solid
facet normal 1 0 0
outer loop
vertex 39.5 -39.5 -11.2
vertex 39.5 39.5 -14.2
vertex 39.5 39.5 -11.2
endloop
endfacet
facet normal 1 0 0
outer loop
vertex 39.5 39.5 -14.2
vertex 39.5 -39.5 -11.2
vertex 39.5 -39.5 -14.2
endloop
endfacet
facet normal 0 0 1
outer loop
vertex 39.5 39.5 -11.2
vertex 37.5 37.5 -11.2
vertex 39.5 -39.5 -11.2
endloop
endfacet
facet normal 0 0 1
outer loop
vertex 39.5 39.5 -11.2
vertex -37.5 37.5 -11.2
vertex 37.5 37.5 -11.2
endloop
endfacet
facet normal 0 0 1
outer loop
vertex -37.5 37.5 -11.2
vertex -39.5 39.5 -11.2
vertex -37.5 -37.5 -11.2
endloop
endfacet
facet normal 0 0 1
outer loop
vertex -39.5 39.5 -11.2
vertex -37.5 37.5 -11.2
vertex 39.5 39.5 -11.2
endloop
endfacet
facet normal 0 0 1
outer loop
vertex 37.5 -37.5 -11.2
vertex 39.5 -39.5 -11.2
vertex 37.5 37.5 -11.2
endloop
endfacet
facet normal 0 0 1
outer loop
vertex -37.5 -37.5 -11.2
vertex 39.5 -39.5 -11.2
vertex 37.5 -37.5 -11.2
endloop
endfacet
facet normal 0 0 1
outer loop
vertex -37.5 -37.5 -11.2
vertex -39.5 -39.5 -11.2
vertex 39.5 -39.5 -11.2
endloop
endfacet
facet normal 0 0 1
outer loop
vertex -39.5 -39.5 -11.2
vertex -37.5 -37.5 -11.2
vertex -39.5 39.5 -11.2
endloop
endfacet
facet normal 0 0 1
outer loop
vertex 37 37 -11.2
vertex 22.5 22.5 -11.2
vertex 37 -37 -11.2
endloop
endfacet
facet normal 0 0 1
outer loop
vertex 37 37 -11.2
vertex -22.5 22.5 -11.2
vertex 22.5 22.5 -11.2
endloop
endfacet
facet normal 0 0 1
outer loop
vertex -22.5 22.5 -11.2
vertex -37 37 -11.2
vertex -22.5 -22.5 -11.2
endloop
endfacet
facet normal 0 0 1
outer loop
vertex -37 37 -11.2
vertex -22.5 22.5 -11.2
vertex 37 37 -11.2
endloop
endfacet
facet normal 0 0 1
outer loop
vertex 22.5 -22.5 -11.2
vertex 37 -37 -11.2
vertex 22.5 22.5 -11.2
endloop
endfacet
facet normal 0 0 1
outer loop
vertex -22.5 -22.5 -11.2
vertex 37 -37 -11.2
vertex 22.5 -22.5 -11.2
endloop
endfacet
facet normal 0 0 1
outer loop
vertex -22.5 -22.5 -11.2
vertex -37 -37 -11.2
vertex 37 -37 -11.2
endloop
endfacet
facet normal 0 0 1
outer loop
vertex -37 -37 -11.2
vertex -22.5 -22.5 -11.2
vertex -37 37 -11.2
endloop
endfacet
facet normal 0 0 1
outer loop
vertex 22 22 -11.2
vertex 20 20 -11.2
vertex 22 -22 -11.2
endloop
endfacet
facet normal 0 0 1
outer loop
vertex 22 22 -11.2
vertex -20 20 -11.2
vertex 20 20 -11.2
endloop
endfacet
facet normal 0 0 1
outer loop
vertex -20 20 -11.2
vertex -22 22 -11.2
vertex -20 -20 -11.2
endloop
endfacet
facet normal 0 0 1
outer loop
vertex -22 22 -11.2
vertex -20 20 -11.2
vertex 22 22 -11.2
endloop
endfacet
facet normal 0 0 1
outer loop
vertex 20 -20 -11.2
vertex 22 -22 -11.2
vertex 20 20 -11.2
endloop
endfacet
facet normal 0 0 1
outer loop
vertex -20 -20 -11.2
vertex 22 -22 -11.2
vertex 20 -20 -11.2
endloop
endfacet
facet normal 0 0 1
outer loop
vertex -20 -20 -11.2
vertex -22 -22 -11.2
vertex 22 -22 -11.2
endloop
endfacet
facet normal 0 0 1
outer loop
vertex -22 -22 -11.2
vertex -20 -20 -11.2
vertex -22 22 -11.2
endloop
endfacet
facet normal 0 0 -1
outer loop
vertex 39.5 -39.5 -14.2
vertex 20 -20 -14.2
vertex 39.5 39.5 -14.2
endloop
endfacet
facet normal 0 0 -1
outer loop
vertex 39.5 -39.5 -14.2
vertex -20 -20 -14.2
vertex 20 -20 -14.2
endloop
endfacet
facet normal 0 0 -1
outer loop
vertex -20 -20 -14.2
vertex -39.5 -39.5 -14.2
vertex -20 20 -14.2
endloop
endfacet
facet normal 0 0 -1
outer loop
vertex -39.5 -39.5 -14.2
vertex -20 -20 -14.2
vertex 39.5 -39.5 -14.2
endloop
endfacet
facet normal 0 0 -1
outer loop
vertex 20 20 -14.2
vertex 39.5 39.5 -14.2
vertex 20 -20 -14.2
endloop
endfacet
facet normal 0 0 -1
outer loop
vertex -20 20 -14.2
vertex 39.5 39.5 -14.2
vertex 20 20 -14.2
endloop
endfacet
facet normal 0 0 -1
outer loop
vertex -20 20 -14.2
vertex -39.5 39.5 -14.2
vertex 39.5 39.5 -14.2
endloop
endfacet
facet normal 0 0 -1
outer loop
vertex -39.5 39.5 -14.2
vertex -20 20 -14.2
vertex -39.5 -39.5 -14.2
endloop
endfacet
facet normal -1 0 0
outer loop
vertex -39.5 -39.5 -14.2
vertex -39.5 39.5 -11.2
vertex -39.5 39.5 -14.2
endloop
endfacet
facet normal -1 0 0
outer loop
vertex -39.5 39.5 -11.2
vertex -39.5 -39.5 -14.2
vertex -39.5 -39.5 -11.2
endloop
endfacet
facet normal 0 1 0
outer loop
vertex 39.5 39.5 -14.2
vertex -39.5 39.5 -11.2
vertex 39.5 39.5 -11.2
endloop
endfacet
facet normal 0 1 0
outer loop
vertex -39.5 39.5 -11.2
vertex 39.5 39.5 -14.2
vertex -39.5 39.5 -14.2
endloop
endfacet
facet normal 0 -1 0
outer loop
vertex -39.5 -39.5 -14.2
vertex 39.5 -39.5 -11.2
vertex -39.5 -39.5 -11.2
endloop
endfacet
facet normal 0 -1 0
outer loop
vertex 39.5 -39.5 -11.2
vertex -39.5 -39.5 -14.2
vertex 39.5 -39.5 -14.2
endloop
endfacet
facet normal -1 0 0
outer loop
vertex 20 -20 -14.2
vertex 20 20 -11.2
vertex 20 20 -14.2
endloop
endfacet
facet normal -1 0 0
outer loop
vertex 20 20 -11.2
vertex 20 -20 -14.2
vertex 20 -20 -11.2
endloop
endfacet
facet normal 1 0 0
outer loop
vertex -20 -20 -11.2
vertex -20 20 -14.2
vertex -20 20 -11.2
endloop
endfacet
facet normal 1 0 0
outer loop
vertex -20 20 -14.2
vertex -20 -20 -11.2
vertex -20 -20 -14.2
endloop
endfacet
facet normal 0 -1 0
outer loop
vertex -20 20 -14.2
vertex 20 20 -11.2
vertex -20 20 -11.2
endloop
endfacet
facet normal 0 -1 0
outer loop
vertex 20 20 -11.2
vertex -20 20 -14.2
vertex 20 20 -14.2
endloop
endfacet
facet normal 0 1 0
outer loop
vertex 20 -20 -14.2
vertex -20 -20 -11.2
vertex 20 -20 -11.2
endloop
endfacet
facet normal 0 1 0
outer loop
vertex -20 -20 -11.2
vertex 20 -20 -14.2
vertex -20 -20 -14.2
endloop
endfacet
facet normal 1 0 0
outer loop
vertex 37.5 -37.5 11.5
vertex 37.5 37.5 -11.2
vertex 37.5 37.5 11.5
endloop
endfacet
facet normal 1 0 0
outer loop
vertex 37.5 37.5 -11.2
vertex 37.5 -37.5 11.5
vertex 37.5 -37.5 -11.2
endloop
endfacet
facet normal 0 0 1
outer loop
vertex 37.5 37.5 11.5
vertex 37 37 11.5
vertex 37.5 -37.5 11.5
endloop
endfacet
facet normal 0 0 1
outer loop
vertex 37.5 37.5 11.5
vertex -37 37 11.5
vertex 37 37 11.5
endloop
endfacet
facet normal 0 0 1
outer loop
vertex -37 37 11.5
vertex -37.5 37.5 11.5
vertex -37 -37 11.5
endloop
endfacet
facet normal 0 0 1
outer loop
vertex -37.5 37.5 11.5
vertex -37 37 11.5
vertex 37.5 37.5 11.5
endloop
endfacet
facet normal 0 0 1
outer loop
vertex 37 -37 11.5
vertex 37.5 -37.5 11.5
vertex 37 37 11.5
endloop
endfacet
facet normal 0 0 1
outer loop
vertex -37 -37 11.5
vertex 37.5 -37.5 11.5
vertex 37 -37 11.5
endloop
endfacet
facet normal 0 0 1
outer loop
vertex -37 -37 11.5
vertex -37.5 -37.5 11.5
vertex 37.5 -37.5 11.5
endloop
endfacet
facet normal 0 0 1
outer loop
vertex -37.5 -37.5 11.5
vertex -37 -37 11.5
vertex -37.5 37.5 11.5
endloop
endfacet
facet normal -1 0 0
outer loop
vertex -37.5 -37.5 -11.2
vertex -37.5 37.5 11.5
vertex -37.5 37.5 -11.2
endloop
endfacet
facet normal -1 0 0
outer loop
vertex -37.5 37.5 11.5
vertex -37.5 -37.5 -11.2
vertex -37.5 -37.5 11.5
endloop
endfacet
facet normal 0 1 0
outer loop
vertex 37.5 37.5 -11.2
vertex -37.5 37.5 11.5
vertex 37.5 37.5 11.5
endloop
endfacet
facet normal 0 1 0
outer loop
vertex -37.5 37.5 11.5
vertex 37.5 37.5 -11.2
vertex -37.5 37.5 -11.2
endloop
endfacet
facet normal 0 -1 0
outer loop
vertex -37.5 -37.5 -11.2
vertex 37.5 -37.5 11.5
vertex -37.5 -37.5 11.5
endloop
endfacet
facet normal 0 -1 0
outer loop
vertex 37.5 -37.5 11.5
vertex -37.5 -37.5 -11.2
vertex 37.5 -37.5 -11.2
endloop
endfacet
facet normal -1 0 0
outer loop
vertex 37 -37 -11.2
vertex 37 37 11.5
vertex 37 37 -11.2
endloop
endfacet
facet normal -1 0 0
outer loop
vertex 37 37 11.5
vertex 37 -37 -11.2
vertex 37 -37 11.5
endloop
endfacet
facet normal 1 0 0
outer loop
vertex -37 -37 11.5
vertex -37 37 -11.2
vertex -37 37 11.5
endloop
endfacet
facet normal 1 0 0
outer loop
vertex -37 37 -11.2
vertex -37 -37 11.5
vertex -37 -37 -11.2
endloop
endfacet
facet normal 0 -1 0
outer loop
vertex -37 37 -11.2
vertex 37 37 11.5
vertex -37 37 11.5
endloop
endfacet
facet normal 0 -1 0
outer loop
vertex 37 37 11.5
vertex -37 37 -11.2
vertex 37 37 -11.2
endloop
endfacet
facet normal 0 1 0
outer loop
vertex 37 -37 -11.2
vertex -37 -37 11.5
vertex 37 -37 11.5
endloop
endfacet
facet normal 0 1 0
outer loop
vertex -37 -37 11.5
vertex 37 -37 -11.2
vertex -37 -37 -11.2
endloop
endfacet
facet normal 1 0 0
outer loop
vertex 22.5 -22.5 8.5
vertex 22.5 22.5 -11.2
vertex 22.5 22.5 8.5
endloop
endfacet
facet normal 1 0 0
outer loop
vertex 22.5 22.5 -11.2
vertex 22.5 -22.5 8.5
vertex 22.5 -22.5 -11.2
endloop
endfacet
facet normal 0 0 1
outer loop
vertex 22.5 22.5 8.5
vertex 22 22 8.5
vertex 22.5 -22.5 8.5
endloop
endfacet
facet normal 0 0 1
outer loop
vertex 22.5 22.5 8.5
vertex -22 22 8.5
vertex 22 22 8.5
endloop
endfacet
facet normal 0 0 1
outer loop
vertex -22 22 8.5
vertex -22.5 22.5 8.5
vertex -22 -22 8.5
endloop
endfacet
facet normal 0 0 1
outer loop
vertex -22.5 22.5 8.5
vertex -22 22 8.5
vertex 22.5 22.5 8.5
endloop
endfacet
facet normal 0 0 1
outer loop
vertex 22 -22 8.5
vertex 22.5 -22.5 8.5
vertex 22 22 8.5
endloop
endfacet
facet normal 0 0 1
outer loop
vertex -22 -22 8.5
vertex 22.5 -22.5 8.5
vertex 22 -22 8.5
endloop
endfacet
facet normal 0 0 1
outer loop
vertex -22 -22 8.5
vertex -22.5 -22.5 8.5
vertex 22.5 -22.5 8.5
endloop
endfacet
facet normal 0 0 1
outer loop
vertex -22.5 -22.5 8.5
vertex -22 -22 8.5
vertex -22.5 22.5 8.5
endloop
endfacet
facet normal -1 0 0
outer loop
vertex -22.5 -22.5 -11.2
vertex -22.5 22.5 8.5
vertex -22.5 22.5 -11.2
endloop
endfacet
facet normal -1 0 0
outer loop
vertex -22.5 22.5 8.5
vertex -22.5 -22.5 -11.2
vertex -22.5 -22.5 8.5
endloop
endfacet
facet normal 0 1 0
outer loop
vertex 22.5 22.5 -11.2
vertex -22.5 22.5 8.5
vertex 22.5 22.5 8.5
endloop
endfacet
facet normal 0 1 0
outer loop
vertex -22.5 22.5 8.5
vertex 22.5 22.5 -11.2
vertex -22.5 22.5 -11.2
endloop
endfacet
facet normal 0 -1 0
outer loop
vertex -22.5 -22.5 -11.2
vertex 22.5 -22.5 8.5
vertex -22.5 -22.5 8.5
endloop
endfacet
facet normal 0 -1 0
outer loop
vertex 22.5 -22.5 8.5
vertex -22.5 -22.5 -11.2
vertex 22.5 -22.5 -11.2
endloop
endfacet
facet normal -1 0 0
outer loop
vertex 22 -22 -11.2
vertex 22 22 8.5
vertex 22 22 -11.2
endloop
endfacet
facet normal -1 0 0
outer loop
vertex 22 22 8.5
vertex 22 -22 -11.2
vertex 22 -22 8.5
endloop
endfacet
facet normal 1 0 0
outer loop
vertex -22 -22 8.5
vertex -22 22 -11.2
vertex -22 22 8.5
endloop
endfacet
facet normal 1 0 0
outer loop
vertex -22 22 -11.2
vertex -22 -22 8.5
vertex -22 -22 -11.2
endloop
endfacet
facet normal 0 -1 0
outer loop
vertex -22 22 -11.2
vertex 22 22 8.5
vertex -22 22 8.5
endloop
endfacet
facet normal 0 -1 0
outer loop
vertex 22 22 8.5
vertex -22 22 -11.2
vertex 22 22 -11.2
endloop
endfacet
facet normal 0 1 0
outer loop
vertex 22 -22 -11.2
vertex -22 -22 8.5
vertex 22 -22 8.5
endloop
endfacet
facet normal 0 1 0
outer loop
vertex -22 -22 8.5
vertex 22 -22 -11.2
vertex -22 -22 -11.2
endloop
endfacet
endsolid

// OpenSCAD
// Copyright (c) 2013, 2014 by Jean-Louis Paquelin (jlp6k).
// This work is licensed under the Creative Commons Attribution
// Partage dans les Mêmes Conditions 3.0 France License.
// To view a copy of this license, visit http://creativecommons.org/licenses/by-sa/3.0/fr/
// CC-BY-SA

// Created 2013-11-29
// Last modified 2014-02-15

// dimensions are set in millimeters

Has_Inner_Cutter = "yes"; // [yes:Output will have an inner cutter, no: simple cookie cutter]

Cutter_Thickness = 0.5;

Outer_Side = 75;
Outer_Height = 23;

Inner_Side_Difference = 15;
Inner_Height_Difference = 3;

Frame_Thickness = 3;
Frame_Flange = 2;

union() {
    // grip / frame
    translate([0, 0, -(Outer_Height / 2) - (Frame_Thickness / 2) + (Frame_Thickness / 10)])
        difference() {
            cube([Outer_Side + Frame_Flange * 2,
                  Outer_Side + Frame_Flange * 2,
                  Frame_Thickness],
                  center = true);

            if(Has_Inner_Cutter == "yes") {
                cube([Outer_Side - Inner_Side_Difference * 2 - Cutter_Thickness * 2 - Frame_Flange * 2,
                      Outer_Side - Inner_Side_Difference * 2 - Cutter_Thickness * 2 - Frame_Flange * 2,
                      Frame_Thickness + 1],
                      center = true);
            } else {
                cube([Outer_Side - Cutter_Thickness * 2 - Frame_Flange * 2,
                      Outer_Side - Cutter_Thickness * 2 - Frame_Flange * 2,
                      Frame_Thickness + 1],
                      center = true);

            }
        }

    // outer cutter
    difference() {
        cube([Outer_Side,
              Outer_Side,
              Outer_Height],
              center = true);
        cube([Outer_Side - Cutter_Thickness * 2,
              Outer_Side - Cutter_Thickness * 2,
              Outer_Height + 10],
              center = true);
    }


    if(Has_Inner_Cutter == "yes") {
        // inner cutter
        translate([0, 0,  -Inner_Height_Difference / 2])
            difference() {
                cube([Outer_Side - Inner_Side_Difference * 2,
                      Outer_Side - Inner_Side_Difference * 2,
                      Outer_Height - Inner_Height_Difference],
                      center = true);
                cube([Outer_Side - Inner_Side_Difference * 2 - Cutter_Thickness * 2,
                      Outer_Side - Inner_Side_Difference * 2 - Cutter_Thickness * 2,
                      Outer_Height - Inner_Height_Difference + 10],
                      center = true);
            }
    }
}
